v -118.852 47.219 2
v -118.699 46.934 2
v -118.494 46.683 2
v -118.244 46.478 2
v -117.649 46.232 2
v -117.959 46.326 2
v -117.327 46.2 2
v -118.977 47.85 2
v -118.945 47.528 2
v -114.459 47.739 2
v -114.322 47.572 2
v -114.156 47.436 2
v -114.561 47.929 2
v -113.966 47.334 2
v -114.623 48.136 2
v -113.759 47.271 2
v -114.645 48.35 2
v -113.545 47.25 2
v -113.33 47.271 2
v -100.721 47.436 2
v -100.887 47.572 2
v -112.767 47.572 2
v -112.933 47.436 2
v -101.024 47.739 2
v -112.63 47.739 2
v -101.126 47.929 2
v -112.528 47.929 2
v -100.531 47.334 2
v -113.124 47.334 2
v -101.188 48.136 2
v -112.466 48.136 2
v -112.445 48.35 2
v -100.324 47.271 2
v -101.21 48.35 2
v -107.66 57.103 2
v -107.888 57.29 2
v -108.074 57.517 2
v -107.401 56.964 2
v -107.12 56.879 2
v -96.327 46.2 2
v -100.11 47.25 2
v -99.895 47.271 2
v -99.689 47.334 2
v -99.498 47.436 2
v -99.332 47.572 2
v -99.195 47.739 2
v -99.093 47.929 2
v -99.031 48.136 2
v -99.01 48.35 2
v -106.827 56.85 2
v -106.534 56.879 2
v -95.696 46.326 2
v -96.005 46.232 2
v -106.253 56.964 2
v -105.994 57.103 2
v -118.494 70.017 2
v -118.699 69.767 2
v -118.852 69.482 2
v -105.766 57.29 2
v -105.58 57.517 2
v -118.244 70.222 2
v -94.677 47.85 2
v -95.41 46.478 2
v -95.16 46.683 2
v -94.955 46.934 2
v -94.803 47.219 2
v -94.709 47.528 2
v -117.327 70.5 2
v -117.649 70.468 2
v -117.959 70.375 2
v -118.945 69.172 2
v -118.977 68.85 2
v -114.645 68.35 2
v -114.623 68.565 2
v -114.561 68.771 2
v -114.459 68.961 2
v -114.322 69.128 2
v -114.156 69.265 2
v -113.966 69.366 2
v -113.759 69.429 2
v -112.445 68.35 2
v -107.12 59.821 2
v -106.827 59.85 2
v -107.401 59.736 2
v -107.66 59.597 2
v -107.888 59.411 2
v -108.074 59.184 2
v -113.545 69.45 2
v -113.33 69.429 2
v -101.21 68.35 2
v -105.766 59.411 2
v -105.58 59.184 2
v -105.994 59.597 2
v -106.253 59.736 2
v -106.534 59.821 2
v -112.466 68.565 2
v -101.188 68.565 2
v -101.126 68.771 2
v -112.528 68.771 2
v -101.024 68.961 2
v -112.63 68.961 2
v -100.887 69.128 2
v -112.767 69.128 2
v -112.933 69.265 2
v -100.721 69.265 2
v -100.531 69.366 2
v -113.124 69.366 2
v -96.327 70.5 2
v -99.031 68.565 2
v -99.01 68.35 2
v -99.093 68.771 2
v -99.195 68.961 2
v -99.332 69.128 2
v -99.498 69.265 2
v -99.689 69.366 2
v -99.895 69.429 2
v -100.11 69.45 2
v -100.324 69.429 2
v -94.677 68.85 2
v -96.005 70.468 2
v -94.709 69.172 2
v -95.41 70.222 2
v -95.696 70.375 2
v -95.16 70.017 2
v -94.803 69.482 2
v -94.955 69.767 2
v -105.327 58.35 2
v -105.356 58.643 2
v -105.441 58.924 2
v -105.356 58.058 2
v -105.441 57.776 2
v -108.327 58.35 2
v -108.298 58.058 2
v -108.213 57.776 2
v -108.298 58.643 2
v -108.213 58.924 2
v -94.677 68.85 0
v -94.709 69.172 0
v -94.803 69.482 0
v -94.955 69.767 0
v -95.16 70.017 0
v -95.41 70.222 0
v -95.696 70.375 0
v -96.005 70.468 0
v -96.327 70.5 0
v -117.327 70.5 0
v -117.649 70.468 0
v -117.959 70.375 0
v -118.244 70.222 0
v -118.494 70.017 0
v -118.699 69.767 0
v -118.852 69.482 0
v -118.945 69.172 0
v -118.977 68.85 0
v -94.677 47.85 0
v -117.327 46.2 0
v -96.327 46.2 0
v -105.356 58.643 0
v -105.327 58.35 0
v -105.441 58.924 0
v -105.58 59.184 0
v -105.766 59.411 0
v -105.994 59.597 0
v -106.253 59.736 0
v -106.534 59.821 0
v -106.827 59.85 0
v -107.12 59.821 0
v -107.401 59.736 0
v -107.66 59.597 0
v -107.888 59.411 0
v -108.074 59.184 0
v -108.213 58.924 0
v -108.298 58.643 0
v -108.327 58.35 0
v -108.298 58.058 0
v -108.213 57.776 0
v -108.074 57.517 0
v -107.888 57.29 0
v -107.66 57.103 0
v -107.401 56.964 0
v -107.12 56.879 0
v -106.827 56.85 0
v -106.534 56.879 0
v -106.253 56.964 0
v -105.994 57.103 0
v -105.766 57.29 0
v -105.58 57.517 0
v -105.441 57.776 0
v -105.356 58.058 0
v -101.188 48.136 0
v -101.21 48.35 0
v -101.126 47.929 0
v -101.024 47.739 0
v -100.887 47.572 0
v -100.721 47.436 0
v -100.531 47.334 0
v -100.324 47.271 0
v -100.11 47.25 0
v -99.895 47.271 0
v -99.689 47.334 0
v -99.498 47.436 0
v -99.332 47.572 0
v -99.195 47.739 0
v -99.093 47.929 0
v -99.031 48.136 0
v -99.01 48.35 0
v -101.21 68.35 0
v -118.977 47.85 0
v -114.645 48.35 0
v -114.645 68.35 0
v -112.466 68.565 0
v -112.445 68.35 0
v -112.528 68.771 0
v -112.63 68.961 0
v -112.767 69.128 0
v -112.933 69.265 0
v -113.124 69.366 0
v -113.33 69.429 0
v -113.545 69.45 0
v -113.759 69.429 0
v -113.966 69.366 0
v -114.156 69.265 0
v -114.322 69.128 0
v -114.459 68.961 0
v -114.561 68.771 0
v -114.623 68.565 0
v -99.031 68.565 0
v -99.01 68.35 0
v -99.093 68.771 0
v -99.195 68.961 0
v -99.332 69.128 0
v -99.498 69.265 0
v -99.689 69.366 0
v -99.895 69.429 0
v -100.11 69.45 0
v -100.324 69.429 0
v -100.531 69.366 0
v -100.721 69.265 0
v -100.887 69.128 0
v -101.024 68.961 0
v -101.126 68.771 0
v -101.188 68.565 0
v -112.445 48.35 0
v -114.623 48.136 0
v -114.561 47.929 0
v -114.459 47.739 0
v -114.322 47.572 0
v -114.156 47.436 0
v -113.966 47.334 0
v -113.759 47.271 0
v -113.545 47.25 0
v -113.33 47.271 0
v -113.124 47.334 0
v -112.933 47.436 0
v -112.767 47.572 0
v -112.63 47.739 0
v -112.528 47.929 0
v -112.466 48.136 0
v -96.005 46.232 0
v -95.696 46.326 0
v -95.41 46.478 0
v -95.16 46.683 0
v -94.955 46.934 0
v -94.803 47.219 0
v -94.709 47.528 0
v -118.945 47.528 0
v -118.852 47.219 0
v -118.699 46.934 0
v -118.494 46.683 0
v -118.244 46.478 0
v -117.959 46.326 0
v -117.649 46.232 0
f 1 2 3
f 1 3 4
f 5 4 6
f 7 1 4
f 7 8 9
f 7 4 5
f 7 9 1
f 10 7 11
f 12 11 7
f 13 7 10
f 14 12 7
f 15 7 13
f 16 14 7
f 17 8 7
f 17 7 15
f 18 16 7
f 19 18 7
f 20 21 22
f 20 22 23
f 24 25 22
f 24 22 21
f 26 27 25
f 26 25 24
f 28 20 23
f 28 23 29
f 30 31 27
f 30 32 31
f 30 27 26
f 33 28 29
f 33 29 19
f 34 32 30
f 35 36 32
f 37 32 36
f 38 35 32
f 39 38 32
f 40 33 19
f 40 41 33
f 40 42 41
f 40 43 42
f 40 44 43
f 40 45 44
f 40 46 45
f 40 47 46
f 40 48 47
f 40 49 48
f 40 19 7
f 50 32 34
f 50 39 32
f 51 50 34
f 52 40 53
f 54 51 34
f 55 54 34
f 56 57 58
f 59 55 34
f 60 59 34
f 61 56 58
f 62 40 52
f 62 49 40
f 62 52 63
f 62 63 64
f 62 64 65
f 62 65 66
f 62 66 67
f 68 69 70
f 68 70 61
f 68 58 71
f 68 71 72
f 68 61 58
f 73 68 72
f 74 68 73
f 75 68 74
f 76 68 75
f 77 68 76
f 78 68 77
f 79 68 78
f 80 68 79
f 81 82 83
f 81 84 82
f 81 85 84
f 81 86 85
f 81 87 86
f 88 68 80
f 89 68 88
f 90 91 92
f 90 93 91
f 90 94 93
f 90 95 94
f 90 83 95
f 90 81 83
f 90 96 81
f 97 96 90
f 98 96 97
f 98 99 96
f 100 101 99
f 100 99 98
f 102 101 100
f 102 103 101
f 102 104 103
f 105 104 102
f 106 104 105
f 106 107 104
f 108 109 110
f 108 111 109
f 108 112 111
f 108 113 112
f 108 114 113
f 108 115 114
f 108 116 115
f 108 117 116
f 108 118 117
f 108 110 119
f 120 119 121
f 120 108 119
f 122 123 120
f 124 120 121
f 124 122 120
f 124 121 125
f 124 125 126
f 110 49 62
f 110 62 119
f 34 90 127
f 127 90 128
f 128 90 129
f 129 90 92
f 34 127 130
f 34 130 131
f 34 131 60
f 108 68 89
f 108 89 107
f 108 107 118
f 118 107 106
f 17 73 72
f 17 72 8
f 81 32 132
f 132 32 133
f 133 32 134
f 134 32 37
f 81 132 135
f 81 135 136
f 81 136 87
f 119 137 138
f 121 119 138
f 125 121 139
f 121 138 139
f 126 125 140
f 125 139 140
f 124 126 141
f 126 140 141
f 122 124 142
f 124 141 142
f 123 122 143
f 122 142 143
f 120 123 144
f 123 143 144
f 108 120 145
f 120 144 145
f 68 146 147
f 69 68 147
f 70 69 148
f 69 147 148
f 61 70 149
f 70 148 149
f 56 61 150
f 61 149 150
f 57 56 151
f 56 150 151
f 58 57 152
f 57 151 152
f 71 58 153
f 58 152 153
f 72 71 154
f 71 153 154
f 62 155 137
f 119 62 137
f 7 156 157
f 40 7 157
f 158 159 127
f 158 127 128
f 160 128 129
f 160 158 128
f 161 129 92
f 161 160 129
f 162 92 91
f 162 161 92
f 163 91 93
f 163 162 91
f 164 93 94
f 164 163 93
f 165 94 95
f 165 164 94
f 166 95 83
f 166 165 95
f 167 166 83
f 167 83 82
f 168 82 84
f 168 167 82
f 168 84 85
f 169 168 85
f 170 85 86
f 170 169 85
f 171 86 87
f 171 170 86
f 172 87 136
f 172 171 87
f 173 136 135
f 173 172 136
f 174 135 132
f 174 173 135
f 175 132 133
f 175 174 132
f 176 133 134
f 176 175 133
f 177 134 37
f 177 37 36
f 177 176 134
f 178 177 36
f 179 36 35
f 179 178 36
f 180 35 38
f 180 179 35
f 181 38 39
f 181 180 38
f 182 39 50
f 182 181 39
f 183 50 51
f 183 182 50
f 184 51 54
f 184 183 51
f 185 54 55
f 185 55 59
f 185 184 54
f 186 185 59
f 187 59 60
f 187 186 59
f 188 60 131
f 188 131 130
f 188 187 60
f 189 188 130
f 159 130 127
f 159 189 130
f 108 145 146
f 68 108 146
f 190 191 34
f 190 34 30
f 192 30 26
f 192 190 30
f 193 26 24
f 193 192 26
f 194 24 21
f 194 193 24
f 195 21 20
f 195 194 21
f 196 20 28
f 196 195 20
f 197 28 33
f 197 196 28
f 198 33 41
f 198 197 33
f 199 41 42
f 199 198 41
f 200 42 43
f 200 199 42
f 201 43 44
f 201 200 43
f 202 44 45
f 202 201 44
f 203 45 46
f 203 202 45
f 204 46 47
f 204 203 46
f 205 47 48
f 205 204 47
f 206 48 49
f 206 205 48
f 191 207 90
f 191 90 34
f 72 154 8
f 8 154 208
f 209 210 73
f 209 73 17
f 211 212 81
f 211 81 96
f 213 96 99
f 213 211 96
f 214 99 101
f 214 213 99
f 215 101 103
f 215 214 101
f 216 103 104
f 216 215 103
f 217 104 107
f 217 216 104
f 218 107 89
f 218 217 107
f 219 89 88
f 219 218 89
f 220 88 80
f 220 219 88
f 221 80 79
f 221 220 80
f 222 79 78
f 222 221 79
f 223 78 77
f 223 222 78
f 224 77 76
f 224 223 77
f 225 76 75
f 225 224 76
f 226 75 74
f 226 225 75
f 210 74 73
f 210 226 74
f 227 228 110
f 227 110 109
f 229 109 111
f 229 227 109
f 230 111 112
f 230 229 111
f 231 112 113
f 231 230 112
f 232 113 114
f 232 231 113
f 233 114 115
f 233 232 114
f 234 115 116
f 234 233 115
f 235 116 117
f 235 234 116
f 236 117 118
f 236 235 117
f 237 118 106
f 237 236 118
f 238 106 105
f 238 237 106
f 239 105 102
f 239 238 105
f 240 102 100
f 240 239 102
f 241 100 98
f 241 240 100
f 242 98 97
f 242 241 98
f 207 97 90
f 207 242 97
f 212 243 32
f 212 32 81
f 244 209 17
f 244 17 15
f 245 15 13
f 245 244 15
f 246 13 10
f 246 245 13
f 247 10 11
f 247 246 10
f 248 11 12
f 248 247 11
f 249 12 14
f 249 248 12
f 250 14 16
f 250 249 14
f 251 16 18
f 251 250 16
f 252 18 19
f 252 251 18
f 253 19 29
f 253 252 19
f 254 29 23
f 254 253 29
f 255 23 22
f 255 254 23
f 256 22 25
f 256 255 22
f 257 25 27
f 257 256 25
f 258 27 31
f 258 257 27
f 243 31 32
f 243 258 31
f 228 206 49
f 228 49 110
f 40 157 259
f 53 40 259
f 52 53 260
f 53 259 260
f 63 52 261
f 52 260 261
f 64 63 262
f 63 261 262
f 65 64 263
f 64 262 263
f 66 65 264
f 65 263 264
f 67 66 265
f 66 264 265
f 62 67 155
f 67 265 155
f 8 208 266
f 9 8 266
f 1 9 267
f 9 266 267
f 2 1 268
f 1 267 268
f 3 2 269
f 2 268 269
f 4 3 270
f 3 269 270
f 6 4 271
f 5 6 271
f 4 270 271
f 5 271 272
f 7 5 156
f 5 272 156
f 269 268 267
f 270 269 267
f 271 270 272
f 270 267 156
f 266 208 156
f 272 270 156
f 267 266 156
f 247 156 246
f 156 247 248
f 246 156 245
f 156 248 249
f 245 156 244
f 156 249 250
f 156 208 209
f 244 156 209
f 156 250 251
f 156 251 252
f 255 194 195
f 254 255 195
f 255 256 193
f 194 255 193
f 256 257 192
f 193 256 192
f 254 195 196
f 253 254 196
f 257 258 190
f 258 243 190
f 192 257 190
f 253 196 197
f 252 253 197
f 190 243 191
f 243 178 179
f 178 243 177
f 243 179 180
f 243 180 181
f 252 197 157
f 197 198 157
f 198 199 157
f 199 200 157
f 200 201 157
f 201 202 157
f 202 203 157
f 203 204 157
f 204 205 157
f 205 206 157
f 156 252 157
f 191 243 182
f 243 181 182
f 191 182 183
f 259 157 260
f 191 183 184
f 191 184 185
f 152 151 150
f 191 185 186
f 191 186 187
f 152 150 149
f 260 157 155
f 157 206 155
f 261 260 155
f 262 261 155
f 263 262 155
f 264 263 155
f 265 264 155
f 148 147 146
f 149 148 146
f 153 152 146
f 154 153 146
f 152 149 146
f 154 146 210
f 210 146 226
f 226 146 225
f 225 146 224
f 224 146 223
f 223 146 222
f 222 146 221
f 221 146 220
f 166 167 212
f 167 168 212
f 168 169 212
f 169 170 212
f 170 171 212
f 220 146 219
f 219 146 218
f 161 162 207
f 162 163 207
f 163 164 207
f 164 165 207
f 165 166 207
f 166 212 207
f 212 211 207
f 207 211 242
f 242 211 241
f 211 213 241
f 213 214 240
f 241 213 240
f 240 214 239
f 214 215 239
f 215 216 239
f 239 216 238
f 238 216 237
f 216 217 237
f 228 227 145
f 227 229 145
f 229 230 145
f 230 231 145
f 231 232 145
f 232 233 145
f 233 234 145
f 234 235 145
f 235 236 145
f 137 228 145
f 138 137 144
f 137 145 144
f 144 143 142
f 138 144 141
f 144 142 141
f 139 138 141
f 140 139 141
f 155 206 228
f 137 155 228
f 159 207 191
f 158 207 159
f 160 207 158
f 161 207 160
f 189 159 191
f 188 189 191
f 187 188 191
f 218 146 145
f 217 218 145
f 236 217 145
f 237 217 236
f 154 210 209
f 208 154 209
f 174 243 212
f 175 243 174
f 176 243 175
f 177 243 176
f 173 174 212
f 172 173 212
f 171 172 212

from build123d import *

# Parameters (mm, degrees)
CROQUIS1_R              = 1.5
SALIENTE_EXTRUIR1_DEPTH = 2
CORTAR_EXTRUIR1_START   = -2
CORTAR_EXTRUIR1_DEPTH   = 2


with BuildPart() as part:
    # Croquis1 → Saliente-Extruir1 (new body)
    with BuildSketch(Plane.XY):
        with BuildLine():
            Line((-117.327111855, 45.850197678), (-96.327111855, 45.850197678))
            ThreePointArc((-96.327111855, 45.850197678), (-94.912898293, 46.435984115), (-94.327111855, 47.850197678))
            Line((-94.327111855, 47.850197678), (-94.327111855, 68.850197678))
            ThreePointArc((-94.327111855, 68.850197678), (-94.912898293, 70.26441124), (-96.327111855, 70.850197678))
            Line((-96.327111855, 70.850197678), (-117.327111855, 70.850197678))
            ThreePointArc((-117.327111855, 70.850197678), (-118.741325417, 70.26441124), (-119.327111855, 68.850197678))
            Line((-119.327111855, 68.850197678), (-119.327111855, 47.850197678))
            ThreePointArc((-119.327111855, 47.850197678), (-118.741325417, 46.435984115), (-117.327111855, 45.850197678))
        make_face()
        with Locations((-106.827111855, 58.350197678)):
            Circle(CROQUIS1_R, mode=Mode.SUBTRACT)
        with BuildLine():
            Line((-114.644626276, 68.350197678), (-114.644626276, 48.350197678))
            ThreePointArc((-114.644626276, 48.350197678), (-113.544626276, 47.250197678), (-112.444626276, 48.350197678))
            Line((-112.444626276, 48.350197678), (-112.444626276, 68.350197678))
            ThreePointArc((-112.444626276, 68.350197678), (-113.544626276, 69.450197678), (-114.644626276, 68.350197678))
        make_face(mode=Mode.SUBTRACT)
        with BuildLine():
            Line((-99.009597434, 48.350197678), (-99.009597434, 68.350197678))
            ThreePointArc((-99.009597434, 68.350197678), (-100.109597434, 69.450197678), (-101.209597434, 68.350197678))
            Line((-101.209597434, 68.350197678), (-101.209597434, 48.350197678))
            ThreePointArc((-101.209597434, 48.350197678), (-100.109597434, 47.250197678), (-99.009597434, 48.350197678))
        make_face(mode=Mode.SUBTRACT)
    extrude(amount=SALIENTE_EXTRUIR1_DEPTH)

    # Croquis2 → Cortar-Extruir1 (cut)
    with BuildSketch(Plane.XY.offset(2).offset(CORTAR_EXTRUIR1_START)):
        with BuildLine():
            Line((-96.327111855, 70.850197678), (-117.327111855, 70.850197678))
            ThreePointArc((-117.327111855, 70.850197678), (-118.741325417, 70.26441124), (-119.327111855, 68.850197678))
            Line((-119.327111855, 68.850197678), (-119.327111855, 47.850197678))
            ThreePointArc((-119.327111855, 47.850197678), (-118.741325417, 46.435984115), (-117.327111855, 45.850197678))
            Line((-117.327111855, 45.850197678), (-96.327111855, 45.850197678))
            ThreePointArc((-96.327111855, 45.850197678), (-94.912898293, 46.435984115), (-94.327111855, 47.850197678))
            Line((-94.327111855, 47.850197678), (-94.327111855, 68.850197678))
            ThreePointArc((-94.327111855, 68.850197678), (-94.912898293, 70.26441124), (-96.327111855, 70.850197678))
        make_face()
        with BuildLine():
            Line((-96.327111855, 70.500197678), (-117.327111855, 70.500197678))
            ThreePointArc((-117.327111855, 70.500197678), (-118.493838044, 70.016923867), (-118.977111855, 68.850197678))
            Line((-118.977111855, 68.850197678), (-118.977111855, 47.850197678))
            ThreePointArc((-118.977111855, 47.850197678), (-118.493838044, 46.683471489), (-117.327111855, 46.200197678))
            Line((-117.327111855, 46.200197678), (-96.327111855, 46.200197678))
            ThreePointArc((-96.327111855, 46.200197678), (-95.160385666, 46.683471489), (-94.677111855, 47.850197678))
            Line((-94.677111855, 47.850197678), (-94.677111855, 68.850197678))
            ThreePointArc((-94.677111855, 68.850197678), (-95.160385666, 70.016923867), (-96.327111855, 70.500197678))
        make_face(mode=Mode.SUBTRACT)
    extrude(amount=CORTAR_EXTRUIR1_DEPTH, mode=Mode.SUBTRACT)


solid = part.part
